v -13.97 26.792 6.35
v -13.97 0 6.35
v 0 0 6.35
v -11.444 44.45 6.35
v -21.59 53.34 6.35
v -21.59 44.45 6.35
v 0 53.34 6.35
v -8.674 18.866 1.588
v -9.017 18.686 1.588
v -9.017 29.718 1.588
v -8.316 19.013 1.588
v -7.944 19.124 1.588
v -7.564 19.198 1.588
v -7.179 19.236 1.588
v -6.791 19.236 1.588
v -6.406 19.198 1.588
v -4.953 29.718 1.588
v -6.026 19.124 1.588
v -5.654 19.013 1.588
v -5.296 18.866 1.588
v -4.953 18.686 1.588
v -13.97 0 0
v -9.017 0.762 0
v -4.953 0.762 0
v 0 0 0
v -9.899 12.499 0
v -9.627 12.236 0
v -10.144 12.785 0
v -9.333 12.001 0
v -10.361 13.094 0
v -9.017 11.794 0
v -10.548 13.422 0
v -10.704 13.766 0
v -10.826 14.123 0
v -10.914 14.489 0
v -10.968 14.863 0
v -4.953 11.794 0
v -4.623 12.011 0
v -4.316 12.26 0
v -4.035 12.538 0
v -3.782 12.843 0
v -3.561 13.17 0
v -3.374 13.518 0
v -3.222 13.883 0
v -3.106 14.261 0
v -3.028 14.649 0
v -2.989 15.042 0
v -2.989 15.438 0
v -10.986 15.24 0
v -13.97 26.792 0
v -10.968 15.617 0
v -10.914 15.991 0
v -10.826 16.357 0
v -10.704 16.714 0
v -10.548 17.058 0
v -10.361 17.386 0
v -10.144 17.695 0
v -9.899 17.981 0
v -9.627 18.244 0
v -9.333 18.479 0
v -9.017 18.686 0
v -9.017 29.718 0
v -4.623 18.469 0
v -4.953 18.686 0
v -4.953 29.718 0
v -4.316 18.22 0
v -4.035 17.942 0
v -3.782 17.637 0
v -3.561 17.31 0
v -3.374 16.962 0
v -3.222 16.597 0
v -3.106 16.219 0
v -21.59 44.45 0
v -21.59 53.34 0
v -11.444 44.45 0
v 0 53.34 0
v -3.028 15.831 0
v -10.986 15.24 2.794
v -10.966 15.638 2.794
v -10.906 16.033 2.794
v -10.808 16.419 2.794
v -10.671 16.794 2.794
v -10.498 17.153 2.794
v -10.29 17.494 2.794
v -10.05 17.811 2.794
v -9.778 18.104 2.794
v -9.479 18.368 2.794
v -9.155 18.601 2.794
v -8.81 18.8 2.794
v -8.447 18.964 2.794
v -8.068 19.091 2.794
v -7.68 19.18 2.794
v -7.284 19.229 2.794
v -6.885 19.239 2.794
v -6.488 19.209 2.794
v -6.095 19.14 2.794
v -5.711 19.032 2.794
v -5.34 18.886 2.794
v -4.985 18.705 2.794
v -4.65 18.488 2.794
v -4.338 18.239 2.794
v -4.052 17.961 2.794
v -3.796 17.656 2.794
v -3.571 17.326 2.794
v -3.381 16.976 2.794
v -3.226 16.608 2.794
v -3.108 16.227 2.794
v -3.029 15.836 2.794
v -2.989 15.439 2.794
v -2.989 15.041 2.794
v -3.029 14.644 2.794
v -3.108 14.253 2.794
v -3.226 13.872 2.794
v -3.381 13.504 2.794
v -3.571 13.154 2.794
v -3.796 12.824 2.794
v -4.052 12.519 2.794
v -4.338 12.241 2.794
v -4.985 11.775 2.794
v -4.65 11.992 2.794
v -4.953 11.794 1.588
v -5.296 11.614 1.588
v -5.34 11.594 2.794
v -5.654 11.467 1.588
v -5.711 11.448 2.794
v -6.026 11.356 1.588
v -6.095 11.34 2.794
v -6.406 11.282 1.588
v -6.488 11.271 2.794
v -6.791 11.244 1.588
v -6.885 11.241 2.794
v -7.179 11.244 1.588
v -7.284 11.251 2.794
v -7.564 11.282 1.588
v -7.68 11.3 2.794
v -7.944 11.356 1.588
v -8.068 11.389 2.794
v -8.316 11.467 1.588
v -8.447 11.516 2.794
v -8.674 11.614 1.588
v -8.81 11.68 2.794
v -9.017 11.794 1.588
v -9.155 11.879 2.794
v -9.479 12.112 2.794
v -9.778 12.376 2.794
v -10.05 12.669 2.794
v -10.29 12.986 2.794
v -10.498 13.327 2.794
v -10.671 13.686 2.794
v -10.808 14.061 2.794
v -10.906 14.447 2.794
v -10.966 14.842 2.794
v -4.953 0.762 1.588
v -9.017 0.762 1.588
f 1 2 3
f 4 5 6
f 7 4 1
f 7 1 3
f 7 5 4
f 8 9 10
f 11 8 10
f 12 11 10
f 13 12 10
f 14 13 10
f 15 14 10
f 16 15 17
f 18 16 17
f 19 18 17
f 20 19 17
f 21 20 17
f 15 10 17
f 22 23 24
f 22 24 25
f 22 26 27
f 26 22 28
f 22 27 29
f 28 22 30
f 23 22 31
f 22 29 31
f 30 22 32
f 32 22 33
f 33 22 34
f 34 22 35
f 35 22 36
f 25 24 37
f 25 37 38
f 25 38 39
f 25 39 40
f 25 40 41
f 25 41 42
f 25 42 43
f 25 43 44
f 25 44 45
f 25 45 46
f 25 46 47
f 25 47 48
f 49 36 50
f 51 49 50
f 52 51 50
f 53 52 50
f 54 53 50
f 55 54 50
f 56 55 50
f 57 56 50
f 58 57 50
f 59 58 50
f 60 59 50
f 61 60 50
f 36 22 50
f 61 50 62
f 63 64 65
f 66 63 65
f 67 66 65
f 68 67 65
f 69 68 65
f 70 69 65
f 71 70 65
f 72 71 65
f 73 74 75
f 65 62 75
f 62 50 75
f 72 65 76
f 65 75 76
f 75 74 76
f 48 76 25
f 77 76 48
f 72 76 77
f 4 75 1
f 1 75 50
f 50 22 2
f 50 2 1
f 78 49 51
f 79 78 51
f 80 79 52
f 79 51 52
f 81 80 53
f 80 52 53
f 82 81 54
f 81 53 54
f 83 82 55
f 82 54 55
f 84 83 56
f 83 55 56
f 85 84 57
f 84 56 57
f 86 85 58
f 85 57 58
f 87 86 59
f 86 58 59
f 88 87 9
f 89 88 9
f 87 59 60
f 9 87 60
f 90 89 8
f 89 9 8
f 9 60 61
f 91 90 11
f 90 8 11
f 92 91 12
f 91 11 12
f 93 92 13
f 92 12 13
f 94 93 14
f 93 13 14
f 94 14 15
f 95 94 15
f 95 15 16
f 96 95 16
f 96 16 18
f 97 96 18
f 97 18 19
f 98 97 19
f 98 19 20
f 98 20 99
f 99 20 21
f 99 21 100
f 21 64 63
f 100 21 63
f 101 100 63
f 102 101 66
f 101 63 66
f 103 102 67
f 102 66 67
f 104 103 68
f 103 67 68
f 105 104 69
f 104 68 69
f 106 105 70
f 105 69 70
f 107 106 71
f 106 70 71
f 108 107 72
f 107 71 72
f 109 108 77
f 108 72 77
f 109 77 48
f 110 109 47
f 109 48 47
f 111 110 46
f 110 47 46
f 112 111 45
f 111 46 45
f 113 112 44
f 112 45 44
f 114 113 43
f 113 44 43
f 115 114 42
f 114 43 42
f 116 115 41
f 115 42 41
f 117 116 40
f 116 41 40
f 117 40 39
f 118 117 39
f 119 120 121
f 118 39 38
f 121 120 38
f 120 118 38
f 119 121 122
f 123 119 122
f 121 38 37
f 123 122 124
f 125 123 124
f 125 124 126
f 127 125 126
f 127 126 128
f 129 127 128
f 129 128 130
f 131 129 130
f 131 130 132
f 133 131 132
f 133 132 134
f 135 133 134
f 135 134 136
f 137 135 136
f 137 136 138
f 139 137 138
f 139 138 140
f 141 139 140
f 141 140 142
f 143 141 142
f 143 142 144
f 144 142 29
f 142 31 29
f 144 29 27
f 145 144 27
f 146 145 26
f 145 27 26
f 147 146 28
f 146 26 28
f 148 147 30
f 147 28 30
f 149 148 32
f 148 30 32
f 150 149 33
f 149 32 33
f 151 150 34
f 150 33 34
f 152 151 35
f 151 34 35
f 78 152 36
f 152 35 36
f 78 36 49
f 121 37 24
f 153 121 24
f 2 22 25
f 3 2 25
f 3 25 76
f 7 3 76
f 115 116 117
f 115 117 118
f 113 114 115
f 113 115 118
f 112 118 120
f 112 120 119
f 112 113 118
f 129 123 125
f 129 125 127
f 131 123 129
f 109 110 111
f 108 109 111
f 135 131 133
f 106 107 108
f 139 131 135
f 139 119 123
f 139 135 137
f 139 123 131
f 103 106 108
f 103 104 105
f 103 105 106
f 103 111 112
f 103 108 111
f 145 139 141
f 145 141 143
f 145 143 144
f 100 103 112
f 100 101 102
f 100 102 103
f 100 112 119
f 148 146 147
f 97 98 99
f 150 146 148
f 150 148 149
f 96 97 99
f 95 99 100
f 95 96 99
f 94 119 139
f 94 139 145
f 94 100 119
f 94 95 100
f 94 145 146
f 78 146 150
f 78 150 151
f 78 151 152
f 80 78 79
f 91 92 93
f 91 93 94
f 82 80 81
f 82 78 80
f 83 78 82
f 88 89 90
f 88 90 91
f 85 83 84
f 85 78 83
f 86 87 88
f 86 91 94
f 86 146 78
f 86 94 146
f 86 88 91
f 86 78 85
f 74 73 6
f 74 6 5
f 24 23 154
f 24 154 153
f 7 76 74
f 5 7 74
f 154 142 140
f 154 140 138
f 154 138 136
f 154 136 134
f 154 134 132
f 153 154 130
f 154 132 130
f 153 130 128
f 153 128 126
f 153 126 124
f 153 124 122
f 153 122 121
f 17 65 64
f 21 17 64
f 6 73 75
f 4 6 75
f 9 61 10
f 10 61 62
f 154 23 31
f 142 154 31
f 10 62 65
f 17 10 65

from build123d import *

# Parameters (mm, degrees)
SKETCH2_W           = 7.62
SKETCH2_H           = 8.89
SKETCH2_W_2         = 13.97
SKETCH2_H_2         = 44.45
BOSS_EXTRUDE1_DEPTH = 6.35
SKETCH3_R           = 4.0005
CUT_EXTRUDE1_DEPTH  = 2.794
CUT_EXTRUDE2_DEPTH  = 1.5875
CUT_EXTRUDE3_DEPTH  = 7.35


with BuildPart() as part:
    # Sketch2 → Boss-Extrude1 (new body)
    with BuildSketch(Plane.XY):
        with Locations((-17.78, 48.895)):
            Rectangle(SKETCH2_W, SKETCH2_H)
        with Locations((-6.985, 48.895)):
            Rectangle(SKETCH2_W_2, SKETCH2_H)
        with Locations((-6.985, 22.225)):
            Rectangle(SKETCH2_W_2, SKETCH2_H_2)
    extrude(amount=BOSS_EXTRUDE1_DEPTH)

    # Sketch3 → Cut-Extrude1 (cut)
    with BuildSketch(Plane(origin=(0, 0, 0), x_dir=(-1, 0, 0), z_dir=(0, 0, -1))):
        with Locations((6.985, 15.24)):
            Circle(SKETCH3_R)
    extrude(amount=-CUT_EXTRUDE1_DEPTH, mode=Mode.SUBTRACT)

    # Sketch4 → Cut-Extrude2 (cut)
    with BuildSketch(Plane(origin=(0, 0, 0), x_dir=(-1, 0, 0), z_dir=(0, 0, -1))):
        Polygon((6.985, 29.718), (9.017, 29.718), (9.017, 15.24), (9.017, 0.762), (4.953, 0.762), (4.953, 15.24), (4.953, 29.718), align=None)
    extrude(amount=-CUT_EXTRUDE2_DEPTH, mode=Mode.SUBTRACT)

    # Sketch5 → Cut-Extrude3 (cut, through all)
    with BuildSketch(Plane(origin=(0, 0, 0), x_dir=(-1, 0, 0), z_dir=(0, 0, -1))):
        Polygon((13.97, 44.45), (11.44430778, 44.45), (13.97, 26.791745209), align=None)
    extrude(amount=-CUT_EXTRUDE3_DEPTH, mode=Mode.SUBTRACT)


solid = part.part
